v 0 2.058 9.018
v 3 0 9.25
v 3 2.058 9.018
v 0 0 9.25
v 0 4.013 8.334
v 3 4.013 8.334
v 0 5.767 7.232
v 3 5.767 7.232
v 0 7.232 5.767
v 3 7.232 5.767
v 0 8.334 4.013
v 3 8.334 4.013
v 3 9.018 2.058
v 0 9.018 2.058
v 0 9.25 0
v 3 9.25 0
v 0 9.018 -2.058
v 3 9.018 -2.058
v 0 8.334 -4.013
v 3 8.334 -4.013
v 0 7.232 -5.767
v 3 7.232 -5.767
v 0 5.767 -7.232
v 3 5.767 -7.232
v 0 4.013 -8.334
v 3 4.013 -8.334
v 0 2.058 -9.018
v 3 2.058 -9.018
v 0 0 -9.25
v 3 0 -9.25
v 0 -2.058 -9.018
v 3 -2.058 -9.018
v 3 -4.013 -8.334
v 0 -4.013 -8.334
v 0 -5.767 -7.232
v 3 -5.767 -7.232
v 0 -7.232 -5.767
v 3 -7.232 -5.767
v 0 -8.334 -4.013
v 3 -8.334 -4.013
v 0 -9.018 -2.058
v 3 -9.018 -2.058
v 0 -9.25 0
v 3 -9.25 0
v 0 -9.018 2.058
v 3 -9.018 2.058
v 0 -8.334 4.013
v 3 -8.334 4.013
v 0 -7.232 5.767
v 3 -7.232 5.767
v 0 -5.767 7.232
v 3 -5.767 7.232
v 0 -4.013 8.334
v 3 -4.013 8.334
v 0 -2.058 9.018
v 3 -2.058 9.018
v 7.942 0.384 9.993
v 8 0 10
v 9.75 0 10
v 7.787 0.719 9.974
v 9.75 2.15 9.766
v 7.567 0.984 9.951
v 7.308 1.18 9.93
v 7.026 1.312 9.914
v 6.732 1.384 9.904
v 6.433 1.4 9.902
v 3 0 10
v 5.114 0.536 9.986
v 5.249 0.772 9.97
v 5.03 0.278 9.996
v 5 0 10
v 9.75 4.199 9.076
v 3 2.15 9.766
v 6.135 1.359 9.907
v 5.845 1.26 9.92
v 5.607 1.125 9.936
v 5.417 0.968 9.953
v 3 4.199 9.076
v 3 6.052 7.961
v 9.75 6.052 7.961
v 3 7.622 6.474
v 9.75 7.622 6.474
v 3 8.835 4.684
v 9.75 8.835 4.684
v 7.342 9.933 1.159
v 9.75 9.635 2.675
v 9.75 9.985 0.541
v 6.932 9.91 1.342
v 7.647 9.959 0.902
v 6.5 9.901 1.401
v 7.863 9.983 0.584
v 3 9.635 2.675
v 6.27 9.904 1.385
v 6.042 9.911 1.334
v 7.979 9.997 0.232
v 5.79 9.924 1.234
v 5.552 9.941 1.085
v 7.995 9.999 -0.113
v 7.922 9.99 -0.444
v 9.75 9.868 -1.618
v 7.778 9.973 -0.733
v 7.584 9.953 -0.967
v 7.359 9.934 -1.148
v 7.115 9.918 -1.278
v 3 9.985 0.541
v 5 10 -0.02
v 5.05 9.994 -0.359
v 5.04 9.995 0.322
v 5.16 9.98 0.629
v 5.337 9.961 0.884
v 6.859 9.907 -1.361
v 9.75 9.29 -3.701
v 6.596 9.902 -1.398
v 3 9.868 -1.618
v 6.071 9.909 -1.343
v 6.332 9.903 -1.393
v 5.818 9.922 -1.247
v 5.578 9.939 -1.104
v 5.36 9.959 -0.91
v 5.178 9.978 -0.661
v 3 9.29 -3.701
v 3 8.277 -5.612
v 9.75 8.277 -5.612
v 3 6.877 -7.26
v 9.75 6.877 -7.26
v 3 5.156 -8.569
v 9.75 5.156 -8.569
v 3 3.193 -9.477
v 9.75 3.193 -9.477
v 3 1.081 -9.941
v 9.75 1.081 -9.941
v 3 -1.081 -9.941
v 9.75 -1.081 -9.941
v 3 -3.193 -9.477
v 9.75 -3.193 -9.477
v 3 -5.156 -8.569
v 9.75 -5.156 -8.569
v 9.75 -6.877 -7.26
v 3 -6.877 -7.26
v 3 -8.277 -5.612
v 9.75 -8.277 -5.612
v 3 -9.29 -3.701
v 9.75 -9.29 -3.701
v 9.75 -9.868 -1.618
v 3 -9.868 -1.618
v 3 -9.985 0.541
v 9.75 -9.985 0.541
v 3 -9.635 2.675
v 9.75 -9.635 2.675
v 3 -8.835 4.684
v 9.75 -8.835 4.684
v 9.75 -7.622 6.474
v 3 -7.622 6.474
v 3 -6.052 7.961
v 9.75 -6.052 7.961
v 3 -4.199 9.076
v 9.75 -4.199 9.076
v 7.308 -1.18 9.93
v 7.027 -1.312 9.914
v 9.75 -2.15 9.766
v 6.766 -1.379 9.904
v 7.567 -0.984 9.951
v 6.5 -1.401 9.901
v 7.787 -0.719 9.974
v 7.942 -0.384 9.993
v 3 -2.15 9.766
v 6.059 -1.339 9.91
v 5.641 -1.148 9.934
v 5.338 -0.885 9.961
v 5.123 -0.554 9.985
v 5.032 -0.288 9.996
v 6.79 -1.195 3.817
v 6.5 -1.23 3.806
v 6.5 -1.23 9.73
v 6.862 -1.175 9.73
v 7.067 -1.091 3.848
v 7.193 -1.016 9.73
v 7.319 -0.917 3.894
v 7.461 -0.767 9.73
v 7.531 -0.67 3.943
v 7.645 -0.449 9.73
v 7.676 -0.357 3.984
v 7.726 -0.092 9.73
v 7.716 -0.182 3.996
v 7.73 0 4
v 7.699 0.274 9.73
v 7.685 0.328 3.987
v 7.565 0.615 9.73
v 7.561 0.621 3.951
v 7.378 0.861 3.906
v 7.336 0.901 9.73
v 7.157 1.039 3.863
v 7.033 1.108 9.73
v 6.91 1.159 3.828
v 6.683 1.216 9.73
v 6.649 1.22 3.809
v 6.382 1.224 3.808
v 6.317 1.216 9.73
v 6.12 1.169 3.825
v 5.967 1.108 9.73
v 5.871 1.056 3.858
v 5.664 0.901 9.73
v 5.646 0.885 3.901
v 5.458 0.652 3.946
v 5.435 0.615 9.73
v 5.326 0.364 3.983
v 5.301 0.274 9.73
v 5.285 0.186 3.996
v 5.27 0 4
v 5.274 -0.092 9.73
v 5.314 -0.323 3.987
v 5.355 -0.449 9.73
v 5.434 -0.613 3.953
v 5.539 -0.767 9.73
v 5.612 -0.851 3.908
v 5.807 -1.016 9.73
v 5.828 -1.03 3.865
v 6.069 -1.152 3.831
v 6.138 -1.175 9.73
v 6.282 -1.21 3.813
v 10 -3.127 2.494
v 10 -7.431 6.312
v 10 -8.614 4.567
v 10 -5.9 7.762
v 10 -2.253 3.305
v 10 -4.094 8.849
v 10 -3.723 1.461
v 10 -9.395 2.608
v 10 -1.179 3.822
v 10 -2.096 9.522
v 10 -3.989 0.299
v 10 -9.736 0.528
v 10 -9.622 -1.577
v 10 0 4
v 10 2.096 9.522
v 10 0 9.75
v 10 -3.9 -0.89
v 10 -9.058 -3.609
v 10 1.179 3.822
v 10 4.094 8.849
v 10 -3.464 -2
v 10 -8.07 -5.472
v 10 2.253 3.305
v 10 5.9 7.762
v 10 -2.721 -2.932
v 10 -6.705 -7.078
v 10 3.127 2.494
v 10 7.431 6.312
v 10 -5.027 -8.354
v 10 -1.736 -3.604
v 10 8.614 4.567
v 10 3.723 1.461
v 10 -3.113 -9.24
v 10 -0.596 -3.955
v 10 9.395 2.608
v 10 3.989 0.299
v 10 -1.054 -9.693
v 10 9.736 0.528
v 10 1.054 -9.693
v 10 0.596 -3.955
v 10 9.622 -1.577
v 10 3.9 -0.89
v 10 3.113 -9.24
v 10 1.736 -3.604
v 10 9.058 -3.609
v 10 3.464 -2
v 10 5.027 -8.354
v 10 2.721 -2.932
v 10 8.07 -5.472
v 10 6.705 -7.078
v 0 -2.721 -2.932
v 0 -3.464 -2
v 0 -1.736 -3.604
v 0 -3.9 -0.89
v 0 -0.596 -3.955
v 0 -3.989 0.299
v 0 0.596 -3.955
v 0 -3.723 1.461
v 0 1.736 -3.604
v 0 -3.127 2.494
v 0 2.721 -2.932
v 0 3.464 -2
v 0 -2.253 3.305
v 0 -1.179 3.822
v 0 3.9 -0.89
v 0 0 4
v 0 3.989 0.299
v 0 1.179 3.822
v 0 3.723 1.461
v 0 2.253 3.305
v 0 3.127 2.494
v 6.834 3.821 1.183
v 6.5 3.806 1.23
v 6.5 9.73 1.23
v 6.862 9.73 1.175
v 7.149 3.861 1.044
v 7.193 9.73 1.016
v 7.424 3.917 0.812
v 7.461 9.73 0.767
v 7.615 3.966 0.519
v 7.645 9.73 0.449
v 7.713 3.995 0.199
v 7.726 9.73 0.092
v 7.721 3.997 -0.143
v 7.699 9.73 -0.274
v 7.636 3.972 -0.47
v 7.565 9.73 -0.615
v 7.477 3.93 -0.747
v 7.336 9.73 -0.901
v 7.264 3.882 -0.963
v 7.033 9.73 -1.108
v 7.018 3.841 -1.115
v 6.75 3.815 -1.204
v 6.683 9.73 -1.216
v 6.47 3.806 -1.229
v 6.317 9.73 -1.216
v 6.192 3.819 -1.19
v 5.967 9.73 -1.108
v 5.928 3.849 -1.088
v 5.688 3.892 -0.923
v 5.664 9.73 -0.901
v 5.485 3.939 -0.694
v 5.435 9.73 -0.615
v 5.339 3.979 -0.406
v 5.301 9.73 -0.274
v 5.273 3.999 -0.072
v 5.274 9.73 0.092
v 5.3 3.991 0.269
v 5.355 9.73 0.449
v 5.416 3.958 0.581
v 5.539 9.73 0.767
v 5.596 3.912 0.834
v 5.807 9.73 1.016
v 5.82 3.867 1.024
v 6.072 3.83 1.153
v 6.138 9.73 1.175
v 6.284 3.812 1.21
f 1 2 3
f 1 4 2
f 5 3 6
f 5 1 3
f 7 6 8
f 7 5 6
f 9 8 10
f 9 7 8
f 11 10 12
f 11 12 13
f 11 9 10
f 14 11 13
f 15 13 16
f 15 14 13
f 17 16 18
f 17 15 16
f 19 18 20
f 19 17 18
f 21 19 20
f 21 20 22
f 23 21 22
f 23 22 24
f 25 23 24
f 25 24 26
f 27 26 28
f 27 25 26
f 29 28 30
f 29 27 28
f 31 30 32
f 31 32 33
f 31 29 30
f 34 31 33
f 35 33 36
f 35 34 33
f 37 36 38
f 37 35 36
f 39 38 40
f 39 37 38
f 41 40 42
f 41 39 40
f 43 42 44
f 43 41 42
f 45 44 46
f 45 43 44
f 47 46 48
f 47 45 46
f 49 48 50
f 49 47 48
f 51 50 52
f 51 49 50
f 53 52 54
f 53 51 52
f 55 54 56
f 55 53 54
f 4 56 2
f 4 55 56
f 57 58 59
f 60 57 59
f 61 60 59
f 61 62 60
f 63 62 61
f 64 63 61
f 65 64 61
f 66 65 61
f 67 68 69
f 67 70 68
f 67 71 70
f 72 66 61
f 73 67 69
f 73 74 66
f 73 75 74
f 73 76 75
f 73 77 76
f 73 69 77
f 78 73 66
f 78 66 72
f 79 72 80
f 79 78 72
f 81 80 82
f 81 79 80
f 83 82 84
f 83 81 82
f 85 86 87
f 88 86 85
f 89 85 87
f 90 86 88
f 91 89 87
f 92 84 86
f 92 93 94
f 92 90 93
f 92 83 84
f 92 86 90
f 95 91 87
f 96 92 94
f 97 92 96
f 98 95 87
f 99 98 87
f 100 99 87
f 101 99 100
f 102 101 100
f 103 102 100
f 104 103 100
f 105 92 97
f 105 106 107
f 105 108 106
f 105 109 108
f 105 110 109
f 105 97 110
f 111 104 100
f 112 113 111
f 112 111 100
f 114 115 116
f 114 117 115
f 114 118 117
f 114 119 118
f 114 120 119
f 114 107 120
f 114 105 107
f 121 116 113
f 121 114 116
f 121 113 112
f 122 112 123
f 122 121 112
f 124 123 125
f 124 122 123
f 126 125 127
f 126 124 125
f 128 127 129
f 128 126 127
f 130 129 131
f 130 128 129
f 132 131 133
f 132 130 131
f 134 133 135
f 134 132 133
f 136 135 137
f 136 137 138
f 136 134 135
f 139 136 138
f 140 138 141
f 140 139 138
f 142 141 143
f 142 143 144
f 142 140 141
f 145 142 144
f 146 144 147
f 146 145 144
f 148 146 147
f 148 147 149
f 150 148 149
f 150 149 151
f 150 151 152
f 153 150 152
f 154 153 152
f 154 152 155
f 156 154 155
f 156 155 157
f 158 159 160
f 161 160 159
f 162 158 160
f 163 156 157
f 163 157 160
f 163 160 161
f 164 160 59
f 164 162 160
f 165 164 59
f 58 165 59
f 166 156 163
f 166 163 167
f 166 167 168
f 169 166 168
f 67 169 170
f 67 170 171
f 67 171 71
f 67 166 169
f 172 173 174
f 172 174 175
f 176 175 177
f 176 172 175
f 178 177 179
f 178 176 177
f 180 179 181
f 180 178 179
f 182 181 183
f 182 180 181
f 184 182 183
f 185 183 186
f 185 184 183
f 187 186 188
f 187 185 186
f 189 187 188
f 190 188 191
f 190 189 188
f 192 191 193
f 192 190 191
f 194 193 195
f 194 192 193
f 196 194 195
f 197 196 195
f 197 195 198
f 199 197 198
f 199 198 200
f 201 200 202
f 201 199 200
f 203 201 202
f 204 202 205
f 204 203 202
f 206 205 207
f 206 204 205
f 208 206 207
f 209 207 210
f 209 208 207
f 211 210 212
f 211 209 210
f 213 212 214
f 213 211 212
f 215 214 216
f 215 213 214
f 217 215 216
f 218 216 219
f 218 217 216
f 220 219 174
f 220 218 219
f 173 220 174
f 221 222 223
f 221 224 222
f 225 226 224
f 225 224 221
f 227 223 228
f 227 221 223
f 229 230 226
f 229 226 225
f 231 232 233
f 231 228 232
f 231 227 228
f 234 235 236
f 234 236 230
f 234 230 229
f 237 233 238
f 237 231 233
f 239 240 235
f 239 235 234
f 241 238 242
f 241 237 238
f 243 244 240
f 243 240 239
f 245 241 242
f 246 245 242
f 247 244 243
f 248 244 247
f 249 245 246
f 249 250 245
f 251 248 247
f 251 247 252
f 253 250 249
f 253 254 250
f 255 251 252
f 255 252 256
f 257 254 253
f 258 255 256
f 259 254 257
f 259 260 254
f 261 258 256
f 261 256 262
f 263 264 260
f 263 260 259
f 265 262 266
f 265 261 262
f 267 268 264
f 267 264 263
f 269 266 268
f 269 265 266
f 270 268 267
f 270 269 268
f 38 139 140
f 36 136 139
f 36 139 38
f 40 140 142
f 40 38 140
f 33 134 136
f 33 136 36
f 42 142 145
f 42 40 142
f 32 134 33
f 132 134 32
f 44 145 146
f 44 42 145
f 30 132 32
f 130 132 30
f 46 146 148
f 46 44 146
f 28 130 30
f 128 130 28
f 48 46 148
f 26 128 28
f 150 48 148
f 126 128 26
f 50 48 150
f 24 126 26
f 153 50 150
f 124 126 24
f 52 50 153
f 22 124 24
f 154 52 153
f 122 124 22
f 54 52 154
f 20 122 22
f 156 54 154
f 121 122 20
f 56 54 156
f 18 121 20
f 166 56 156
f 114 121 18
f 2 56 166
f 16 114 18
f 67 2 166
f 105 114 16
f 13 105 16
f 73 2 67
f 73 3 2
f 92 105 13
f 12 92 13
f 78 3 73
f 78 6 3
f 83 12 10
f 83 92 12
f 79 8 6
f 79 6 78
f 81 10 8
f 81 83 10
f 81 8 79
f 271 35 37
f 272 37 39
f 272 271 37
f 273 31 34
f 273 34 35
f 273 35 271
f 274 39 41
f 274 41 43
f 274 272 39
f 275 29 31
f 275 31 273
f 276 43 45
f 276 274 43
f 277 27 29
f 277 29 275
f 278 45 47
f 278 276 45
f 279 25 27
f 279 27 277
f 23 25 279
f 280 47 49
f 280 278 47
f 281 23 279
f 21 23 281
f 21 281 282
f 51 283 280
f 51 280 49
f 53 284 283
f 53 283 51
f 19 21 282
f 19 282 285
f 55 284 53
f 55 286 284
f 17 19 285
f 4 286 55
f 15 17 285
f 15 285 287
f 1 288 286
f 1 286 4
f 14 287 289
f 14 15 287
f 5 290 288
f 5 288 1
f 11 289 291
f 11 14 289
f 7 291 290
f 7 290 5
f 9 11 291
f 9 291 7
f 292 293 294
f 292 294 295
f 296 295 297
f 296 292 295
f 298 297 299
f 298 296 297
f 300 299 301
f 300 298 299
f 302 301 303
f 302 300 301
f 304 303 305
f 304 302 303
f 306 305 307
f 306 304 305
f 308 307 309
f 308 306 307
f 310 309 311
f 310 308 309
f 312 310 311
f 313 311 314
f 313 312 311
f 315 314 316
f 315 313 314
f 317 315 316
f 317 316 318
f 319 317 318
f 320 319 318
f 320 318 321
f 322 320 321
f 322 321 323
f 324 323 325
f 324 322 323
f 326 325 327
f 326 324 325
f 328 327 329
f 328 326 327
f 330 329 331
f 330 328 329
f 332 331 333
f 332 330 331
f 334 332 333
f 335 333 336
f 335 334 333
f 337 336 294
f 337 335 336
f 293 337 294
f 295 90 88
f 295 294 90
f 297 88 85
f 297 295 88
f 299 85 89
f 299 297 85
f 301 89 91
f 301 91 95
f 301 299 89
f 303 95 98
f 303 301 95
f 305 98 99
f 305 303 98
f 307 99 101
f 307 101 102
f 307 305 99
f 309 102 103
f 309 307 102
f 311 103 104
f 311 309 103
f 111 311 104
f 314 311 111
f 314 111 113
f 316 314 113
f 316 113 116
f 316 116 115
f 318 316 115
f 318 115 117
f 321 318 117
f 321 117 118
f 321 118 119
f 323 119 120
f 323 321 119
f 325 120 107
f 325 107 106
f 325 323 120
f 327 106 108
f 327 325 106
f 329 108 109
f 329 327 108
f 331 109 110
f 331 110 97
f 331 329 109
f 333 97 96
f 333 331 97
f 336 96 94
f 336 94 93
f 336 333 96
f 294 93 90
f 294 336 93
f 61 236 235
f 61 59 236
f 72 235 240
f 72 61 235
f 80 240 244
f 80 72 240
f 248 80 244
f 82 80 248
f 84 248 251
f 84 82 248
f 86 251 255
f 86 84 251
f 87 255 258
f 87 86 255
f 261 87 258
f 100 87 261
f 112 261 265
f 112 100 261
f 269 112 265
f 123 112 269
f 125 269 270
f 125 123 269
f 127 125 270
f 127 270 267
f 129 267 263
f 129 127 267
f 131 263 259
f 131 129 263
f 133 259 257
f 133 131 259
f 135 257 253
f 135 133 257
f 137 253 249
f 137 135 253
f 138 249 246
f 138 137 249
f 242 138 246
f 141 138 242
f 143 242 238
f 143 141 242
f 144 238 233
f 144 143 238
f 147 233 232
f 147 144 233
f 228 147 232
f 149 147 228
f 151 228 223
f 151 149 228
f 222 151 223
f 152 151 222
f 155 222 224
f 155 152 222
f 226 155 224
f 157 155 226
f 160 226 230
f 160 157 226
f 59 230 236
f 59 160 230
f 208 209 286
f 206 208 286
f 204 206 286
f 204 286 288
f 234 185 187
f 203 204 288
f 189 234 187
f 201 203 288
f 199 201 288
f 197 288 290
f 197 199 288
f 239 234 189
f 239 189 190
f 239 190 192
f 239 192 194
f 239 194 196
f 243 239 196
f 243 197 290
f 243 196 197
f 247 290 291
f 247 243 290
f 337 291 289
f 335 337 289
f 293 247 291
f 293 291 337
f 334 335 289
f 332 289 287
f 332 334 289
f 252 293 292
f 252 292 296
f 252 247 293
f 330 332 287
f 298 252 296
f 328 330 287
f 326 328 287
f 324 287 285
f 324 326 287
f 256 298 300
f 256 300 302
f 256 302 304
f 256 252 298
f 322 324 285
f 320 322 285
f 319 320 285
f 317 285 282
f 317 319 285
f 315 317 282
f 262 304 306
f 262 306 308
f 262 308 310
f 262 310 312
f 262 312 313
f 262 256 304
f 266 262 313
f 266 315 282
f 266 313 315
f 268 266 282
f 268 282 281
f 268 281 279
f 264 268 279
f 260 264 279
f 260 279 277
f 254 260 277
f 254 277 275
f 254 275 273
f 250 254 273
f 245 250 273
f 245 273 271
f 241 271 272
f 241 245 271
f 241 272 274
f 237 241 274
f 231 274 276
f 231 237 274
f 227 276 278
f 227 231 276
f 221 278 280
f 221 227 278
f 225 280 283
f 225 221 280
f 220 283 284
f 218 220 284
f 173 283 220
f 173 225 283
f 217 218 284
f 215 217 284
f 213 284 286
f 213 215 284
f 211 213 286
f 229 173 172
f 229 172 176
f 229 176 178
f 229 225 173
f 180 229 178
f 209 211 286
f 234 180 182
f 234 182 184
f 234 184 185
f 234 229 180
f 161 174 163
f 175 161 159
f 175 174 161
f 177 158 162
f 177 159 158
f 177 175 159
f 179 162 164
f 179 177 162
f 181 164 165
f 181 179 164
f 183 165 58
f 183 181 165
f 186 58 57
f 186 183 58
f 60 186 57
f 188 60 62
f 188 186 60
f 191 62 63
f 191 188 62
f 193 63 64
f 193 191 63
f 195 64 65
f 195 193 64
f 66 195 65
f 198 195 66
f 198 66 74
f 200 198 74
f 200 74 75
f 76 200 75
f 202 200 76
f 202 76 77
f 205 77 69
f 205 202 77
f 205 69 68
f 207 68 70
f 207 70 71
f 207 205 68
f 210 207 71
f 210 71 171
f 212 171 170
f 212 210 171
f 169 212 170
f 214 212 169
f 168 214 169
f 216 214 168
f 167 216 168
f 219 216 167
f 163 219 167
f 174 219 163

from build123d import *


with BuildPart() as part:
    # Sketch1 → Revolve1 (revolve)
    with BuildSketch(Plane.XY, mode=Mode.PRIVATE) as revolve1_sk:
        Polygon((0, 4), (10, 4), (10, 9.75), (9.75, 10), (3, 10), (3, 9.25), (0, 9.25), align=None)
    revolve(revolve1_sk.sketch.rotate(Axis((10, 0, 0), (-1, 0, 0)), 270), axis=Axis((10, 0, 0), (-1, 0, 0)))

    # Sketch2 → Cut-Revolve1 (revolve, cut)
    with BuildSketch(Plane(origin=(6.5, 0, 0), x_dir=(0, 0, -1), z_dir=(1, 0, 0)), mode=Mode.PRIVATE) as cut_revolve1_sk:
        Polygon((0, 10), (1.5, 10), (1.2295, 9.7295), (1.2295, 0), (0, 0), align=None)
    revolve(cut_revolve1_sk.sketch.rotate(Axis((6.5, 0, 0), (0, 1, 0)), 180), axis=Axis((6.5, 0, 0), (0, 1, 0)), mode=Mode.SUBTRACT)

    # Sketch3 → Cut-Revolve2 (revolve, cut)
    with BuildSketch(Plane(origin=(6.5, 0, 0), x_dir=(0, 0, -1), z_dir=(1, 0, 0)), mode=Mode.PRIVATE) as cut_revolve2_sk:
        Polygon((-10, 0), (-10, 1.5), (-9.7295, 1.2295), (0, 1.2295), (0, 0), align=None)
    revolve(cut_revolve2_sk.sketch.rotate(Axis((6.5, 0, 0), (0, 0, 1)), 180), axis=Axis((6.5, 0, 0), (0, 0, 1)), mode=Mode.SUBTRACT)


solid = part.part
